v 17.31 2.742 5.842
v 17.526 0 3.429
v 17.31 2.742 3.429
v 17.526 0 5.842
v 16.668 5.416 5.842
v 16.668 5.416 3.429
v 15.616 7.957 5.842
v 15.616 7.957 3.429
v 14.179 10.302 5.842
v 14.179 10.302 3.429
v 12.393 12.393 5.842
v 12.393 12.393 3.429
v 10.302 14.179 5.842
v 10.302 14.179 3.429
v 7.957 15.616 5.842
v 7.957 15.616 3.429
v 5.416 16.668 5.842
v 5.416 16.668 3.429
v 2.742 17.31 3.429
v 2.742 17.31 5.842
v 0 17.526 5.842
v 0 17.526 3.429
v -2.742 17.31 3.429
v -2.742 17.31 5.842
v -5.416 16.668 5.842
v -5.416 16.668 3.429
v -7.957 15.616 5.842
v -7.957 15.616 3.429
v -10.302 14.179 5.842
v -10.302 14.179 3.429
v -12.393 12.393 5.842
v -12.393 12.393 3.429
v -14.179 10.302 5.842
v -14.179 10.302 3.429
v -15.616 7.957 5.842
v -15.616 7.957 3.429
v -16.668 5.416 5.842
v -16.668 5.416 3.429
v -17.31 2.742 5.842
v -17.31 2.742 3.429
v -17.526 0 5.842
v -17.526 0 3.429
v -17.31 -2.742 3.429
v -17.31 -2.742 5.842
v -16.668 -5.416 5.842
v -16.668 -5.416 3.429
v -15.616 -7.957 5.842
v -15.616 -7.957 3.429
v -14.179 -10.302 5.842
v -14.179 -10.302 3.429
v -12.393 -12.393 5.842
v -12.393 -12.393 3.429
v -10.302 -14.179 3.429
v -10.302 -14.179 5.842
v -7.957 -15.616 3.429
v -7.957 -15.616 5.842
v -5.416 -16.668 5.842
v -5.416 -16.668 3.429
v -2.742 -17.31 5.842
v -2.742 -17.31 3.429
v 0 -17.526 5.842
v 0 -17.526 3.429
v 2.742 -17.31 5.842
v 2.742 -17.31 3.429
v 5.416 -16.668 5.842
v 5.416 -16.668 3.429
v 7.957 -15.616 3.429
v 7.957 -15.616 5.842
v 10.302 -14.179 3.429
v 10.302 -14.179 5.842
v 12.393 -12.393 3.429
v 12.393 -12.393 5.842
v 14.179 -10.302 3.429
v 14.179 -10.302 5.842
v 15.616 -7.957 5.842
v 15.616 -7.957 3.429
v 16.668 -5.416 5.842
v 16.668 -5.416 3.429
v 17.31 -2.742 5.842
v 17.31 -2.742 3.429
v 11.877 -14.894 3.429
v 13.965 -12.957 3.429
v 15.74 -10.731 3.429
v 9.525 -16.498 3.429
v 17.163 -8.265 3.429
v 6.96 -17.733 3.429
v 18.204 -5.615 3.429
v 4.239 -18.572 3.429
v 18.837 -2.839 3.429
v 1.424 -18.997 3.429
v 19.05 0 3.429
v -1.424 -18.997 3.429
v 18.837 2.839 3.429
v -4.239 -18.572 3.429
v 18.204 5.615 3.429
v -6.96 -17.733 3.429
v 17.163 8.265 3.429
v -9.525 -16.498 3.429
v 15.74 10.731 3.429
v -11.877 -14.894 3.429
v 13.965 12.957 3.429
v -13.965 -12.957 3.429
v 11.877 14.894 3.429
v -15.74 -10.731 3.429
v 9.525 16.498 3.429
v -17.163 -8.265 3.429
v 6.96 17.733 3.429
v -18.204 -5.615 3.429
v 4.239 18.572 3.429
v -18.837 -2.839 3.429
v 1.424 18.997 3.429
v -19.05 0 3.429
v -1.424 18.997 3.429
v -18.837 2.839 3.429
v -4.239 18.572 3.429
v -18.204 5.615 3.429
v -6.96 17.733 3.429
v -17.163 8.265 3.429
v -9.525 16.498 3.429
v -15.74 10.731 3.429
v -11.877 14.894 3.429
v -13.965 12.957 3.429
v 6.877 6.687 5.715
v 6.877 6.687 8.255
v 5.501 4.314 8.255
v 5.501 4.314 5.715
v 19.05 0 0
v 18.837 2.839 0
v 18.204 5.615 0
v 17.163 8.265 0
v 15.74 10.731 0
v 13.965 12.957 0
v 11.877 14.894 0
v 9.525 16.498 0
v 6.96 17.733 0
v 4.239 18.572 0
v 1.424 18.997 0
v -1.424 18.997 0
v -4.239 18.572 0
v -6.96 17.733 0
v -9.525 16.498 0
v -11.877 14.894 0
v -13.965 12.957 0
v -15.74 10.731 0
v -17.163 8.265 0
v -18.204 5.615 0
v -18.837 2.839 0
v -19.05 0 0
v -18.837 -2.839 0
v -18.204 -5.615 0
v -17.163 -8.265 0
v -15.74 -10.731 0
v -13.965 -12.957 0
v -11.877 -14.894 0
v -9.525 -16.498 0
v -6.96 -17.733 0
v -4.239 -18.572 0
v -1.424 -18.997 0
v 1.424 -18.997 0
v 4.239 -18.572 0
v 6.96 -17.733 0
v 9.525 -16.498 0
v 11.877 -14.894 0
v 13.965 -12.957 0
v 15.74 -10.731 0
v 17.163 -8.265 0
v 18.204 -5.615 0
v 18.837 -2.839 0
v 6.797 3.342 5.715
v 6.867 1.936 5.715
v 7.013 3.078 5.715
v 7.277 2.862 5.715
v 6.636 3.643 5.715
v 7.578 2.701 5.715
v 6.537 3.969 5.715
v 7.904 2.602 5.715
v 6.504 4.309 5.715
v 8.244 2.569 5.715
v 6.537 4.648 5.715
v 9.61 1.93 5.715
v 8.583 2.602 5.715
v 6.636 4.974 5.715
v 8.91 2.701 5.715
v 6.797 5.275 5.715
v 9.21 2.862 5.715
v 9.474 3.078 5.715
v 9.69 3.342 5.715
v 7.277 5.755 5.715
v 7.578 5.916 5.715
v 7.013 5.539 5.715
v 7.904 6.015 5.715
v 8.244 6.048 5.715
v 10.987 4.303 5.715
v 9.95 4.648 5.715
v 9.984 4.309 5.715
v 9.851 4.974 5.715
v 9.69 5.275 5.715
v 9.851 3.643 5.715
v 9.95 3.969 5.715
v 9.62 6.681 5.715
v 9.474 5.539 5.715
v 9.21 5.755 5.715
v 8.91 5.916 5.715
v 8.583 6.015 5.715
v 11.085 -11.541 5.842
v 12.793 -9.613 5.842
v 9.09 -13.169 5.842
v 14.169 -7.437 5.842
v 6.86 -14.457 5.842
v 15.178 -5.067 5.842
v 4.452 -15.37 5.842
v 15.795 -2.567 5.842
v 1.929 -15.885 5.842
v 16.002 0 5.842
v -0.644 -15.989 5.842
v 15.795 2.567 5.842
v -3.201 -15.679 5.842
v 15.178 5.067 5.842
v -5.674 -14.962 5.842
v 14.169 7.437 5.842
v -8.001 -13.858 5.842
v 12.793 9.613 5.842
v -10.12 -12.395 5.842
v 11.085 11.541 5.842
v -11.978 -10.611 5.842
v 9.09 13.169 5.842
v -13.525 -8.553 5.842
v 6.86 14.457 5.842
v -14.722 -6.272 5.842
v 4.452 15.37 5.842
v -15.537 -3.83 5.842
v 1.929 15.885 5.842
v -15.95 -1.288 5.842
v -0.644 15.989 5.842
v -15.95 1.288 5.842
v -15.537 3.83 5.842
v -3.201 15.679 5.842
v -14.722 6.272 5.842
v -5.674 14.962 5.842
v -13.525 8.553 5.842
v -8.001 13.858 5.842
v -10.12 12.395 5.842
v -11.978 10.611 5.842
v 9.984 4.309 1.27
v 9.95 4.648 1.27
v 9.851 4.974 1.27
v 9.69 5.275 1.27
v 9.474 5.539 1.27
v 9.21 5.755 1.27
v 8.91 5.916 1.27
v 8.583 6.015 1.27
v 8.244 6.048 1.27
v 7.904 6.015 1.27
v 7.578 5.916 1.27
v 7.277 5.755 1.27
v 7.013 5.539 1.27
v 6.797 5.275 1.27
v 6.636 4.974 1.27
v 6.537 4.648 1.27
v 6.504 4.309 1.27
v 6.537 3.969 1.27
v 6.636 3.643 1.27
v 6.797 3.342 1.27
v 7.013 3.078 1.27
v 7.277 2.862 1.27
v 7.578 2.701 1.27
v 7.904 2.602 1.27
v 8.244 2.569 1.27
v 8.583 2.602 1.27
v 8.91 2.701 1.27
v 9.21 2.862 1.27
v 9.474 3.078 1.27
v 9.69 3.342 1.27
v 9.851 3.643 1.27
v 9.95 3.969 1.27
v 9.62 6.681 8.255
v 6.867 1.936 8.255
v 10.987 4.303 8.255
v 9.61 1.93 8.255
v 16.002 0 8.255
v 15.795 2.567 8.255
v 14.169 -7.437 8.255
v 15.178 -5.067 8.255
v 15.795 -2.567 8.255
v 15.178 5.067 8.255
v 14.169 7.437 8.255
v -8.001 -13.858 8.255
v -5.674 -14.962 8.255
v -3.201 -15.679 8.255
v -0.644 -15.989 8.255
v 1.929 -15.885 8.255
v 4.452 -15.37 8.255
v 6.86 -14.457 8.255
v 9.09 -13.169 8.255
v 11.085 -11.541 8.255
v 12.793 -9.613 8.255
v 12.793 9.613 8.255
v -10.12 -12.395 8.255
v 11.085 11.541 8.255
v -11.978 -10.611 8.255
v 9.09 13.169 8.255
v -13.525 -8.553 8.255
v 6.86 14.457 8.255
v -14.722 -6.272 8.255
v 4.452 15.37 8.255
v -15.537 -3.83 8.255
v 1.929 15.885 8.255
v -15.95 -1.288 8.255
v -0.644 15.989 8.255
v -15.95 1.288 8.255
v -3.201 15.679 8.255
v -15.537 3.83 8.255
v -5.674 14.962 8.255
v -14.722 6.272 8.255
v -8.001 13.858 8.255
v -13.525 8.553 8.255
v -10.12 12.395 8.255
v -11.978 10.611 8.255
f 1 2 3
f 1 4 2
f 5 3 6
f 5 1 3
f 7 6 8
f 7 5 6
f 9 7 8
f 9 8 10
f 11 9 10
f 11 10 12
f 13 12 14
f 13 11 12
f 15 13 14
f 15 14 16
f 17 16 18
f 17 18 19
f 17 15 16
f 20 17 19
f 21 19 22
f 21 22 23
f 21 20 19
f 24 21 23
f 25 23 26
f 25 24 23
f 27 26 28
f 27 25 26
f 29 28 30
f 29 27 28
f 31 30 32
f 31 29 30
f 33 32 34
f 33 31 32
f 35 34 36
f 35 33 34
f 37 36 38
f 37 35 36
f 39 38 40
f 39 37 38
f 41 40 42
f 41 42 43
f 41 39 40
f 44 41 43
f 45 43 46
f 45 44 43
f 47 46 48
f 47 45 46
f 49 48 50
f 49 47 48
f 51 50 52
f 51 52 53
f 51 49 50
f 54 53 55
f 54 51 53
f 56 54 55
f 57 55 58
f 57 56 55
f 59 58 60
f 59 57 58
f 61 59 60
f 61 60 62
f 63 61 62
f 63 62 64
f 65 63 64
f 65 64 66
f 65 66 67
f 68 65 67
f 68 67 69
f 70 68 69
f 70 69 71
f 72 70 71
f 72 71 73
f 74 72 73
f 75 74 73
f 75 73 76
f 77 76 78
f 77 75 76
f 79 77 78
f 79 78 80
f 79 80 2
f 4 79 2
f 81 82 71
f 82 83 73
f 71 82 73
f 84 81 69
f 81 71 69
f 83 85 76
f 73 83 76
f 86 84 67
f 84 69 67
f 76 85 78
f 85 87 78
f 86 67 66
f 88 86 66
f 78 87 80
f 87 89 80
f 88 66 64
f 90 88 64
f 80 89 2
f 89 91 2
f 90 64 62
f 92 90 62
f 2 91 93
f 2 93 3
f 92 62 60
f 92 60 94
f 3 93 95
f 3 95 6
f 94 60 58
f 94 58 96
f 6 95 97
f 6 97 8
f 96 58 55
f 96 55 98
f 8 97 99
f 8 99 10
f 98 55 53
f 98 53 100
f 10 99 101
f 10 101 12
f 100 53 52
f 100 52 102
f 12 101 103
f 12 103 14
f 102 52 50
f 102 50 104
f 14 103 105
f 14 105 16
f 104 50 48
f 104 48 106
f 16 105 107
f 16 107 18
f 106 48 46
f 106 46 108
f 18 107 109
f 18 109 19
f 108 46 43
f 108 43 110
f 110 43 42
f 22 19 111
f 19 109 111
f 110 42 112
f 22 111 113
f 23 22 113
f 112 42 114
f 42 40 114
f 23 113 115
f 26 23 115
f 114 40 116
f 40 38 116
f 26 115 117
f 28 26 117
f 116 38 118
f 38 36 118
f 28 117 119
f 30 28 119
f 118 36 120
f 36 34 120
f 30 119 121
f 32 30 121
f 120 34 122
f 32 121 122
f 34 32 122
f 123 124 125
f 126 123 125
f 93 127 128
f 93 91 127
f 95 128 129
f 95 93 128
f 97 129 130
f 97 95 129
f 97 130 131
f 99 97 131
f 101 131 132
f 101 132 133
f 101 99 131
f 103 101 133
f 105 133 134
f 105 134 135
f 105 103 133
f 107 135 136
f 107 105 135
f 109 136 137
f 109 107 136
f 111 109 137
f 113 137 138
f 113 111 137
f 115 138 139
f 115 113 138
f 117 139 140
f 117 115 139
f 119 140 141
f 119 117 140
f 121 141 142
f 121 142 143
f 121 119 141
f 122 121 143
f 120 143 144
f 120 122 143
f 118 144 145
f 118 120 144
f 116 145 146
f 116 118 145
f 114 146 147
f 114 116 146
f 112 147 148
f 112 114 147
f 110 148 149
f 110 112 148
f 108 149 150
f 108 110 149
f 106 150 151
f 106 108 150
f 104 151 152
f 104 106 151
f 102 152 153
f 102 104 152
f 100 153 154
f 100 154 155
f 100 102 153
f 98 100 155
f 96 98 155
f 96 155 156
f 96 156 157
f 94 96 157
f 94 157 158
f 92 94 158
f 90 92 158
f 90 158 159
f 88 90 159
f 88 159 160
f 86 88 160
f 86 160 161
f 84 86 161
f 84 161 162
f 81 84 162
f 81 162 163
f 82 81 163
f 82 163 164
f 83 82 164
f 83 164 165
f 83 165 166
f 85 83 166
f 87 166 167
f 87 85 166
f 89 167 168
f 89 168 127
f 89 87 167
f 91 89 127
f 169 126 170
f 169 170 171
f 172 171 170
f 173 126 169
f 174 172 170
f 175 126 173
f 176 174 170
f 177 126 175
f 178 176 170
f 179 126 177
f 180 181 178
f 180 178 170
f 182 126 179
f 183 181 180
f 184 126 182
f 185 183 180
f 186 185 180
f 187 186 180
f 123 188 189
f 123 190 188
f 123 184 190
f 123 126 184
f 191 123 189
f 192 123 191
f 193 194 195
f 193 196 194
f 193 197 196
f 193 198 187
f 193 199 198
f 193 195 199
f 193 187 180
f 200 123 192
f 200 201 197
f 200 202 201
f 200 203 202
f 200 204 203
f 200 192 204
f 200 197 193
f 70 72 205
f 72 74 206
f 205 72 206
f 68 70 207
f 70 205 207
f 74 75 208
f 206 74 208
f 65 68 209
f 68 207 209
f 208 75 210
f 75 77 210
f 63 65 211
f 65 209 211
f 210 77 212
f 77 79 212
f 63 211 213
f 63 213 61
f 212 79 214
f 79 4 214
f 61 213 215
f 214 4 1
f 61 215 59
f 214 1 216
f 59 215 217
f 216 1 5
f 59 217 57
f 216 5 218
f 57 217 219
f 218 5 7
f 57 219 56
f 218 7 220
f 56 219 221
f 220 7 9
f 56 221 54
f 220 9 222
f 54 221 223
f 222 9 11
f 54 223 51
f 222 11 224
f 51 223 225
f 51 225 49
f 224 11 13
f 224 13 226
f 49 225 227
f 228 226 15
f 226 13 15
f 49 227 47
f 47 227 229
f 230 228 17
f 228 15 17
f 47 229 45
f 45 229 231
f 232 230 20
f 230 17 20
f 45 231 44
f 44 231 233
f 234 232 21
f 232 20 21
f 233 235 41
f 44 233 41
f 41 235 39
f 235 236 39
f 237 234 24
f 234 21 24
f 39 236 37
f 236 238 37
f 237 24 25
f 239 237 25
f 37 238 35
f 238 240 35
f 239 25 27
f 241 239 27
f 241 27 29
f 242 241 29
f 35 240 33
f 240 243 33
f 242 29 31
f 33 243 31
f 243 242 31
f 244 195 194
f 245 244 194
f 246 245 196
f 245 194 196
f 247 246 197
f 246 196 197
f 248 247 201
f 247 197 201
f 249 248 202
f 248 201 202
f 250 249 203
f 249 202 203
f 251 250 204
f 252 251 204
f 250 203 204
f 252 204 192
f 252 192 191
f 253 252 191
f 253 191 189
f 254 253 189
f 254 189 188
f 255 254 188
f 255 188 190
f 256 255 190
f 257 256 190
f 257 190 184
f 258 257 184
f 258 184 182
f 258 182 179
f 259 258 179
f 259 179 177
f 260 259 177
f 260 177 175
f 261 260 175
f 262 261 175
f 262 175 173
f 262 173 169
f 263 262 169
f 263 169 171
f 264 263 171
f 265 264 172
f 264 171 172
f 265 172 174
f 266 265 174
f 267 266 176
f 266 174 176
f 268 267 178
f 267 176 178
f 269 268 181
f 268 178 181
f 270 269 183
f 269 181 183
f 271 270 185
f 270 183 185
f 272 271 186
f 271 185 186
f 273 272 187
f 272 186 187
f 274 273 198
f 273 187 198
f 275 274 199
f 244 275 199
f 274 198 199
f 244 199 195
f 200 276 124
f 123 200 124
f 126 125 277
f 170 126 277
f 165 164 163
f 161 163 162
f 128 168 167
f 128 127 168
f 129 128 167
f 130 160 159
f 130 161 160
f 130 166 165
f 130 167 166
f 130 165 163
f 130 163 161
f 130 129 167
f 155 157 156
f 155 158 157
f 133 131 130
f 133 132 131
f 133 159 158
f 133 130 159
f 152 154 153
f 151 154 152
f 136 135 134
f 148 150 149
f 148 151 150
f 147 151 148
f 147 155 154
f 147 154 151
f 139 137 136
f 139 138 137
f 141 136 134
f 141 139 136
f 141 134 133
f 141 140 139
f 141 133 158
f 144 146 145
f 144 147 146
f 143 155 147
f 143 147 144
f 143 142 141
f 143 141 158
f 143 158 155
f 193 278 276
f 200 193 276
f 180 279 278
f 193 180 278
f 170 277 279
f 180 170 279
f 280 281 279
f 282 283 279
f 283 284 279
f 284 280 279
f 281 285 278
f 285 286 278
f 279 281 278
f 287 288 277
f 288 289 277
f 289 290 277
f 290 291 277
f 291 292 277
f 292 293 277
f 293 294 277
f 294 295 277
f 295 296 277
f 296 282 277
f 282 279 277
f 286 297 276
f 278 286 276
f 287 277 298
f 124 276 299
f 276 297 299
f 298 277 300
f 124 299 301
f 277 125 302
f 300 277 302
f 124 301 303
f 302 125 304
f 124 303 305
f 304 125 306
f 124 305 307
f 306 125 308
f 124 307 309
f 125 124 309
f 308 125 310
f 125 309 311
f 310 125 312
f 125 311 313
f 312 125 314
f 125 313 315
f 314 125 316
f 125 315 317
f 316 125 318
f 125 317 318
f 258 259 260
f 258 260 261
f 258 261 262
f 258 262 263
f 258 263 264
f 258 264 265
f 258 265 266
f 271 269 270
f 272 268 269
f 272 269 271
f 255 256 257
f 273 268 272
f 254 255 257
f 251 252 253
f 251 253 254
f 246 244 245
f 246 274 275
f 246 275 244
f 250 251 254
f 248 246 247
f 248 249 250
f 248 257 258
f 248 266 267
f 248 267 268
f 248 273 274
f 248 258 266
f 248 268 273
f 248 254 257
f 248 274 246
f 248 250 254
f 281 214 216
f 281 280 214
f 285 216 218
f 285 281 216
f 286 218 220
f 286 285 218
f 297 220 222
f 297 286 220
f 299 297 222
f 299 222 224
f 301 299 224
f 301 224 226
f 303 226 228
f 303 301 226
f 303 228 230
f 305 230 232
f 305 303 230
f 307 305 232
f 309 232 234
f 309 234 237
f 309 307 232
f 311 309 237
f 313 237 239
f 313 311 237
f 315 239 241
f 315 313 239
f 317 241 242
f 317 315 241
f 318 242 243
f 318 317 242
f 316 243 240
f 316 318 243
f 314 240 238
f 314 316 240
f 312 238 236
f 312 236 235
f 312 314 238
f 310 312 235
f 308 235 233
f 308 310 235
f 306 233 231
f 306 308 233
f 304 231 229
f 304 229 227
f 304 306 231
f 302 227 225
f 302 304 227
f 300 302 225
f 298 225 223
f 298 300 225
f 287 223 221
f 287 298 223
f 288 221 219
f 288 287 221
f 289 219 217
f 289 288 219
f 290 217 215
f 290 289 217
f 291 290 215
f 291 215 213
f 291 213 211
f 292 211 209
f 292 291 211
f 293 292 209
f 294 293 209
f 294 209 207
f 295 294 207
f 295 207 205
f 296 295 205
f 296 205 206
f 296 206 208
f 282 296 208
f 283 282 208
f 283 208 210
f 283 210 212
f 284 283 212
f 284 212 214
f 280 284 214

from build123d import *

# Parameters (mm, degrees)
F0_W     = 19.05
F0_H     = 3.429
F2_W     = 17.526
F2_H     = 2.413
F4_W     = 16.002
F4_H     = 2.413
F6_R     = 1.7399
F7_DEPTH = 6.985
F9_DEPTH = 2.54


with BuildPart() as f1:
    # F0 (on Front) → F1 (revolve)
    with BuildSketch(Plane.XZ):
        with Locations((9.525, 1.7145)):
            Rectangle(F0_W, F0_H)
    revolve(axis=Axis((0, 0, 1.7145), (0, 0, 1)))

    # F2 (on Front) → F3 (revolve)
    with BuildSketch(Plane.XZ):
        with Locations((8.763, 4.6355)):
            Rectangle(F2_W, F2_H)
    revolve(axis=Axis((0, 0, 4.6355), (0, 0, 1)))

    # F4 (on Front) → F5 (revolve)
    with BuildSketch(Plane.XZ):
        with Locations((8.001, 7.0485)):
            Rectangle(F4_W, F4_H)
    revolve(axis=Axis((0, 0, 7.0485), (0, 0, 1)))

    # F6 (on face) → F7 (cut)
    with BuildSketch(Plane.XY.offset(8.255)):
        with Locations((8.243714, 4.308599)):
            Circle(F6_R)
    extrude(amount=-F7_DEPTH, mode=Mode.SUBTRACT)

    # F8 (on face) → F9 (cut)
    with BuildSketch(Plane.XY.offset(8.255)):
        Polygon((10.986907, 4.302744), (9.620381, 6.681347), (6.877187, 6.687202), (5.50052, 4.314454), (6.867046, 1.935851), (9.61024, 1.929996), align=None)
    extrude(amount=-F9_DEPTH, mode=Mode.SUBTRACT)


solid = f1.part
